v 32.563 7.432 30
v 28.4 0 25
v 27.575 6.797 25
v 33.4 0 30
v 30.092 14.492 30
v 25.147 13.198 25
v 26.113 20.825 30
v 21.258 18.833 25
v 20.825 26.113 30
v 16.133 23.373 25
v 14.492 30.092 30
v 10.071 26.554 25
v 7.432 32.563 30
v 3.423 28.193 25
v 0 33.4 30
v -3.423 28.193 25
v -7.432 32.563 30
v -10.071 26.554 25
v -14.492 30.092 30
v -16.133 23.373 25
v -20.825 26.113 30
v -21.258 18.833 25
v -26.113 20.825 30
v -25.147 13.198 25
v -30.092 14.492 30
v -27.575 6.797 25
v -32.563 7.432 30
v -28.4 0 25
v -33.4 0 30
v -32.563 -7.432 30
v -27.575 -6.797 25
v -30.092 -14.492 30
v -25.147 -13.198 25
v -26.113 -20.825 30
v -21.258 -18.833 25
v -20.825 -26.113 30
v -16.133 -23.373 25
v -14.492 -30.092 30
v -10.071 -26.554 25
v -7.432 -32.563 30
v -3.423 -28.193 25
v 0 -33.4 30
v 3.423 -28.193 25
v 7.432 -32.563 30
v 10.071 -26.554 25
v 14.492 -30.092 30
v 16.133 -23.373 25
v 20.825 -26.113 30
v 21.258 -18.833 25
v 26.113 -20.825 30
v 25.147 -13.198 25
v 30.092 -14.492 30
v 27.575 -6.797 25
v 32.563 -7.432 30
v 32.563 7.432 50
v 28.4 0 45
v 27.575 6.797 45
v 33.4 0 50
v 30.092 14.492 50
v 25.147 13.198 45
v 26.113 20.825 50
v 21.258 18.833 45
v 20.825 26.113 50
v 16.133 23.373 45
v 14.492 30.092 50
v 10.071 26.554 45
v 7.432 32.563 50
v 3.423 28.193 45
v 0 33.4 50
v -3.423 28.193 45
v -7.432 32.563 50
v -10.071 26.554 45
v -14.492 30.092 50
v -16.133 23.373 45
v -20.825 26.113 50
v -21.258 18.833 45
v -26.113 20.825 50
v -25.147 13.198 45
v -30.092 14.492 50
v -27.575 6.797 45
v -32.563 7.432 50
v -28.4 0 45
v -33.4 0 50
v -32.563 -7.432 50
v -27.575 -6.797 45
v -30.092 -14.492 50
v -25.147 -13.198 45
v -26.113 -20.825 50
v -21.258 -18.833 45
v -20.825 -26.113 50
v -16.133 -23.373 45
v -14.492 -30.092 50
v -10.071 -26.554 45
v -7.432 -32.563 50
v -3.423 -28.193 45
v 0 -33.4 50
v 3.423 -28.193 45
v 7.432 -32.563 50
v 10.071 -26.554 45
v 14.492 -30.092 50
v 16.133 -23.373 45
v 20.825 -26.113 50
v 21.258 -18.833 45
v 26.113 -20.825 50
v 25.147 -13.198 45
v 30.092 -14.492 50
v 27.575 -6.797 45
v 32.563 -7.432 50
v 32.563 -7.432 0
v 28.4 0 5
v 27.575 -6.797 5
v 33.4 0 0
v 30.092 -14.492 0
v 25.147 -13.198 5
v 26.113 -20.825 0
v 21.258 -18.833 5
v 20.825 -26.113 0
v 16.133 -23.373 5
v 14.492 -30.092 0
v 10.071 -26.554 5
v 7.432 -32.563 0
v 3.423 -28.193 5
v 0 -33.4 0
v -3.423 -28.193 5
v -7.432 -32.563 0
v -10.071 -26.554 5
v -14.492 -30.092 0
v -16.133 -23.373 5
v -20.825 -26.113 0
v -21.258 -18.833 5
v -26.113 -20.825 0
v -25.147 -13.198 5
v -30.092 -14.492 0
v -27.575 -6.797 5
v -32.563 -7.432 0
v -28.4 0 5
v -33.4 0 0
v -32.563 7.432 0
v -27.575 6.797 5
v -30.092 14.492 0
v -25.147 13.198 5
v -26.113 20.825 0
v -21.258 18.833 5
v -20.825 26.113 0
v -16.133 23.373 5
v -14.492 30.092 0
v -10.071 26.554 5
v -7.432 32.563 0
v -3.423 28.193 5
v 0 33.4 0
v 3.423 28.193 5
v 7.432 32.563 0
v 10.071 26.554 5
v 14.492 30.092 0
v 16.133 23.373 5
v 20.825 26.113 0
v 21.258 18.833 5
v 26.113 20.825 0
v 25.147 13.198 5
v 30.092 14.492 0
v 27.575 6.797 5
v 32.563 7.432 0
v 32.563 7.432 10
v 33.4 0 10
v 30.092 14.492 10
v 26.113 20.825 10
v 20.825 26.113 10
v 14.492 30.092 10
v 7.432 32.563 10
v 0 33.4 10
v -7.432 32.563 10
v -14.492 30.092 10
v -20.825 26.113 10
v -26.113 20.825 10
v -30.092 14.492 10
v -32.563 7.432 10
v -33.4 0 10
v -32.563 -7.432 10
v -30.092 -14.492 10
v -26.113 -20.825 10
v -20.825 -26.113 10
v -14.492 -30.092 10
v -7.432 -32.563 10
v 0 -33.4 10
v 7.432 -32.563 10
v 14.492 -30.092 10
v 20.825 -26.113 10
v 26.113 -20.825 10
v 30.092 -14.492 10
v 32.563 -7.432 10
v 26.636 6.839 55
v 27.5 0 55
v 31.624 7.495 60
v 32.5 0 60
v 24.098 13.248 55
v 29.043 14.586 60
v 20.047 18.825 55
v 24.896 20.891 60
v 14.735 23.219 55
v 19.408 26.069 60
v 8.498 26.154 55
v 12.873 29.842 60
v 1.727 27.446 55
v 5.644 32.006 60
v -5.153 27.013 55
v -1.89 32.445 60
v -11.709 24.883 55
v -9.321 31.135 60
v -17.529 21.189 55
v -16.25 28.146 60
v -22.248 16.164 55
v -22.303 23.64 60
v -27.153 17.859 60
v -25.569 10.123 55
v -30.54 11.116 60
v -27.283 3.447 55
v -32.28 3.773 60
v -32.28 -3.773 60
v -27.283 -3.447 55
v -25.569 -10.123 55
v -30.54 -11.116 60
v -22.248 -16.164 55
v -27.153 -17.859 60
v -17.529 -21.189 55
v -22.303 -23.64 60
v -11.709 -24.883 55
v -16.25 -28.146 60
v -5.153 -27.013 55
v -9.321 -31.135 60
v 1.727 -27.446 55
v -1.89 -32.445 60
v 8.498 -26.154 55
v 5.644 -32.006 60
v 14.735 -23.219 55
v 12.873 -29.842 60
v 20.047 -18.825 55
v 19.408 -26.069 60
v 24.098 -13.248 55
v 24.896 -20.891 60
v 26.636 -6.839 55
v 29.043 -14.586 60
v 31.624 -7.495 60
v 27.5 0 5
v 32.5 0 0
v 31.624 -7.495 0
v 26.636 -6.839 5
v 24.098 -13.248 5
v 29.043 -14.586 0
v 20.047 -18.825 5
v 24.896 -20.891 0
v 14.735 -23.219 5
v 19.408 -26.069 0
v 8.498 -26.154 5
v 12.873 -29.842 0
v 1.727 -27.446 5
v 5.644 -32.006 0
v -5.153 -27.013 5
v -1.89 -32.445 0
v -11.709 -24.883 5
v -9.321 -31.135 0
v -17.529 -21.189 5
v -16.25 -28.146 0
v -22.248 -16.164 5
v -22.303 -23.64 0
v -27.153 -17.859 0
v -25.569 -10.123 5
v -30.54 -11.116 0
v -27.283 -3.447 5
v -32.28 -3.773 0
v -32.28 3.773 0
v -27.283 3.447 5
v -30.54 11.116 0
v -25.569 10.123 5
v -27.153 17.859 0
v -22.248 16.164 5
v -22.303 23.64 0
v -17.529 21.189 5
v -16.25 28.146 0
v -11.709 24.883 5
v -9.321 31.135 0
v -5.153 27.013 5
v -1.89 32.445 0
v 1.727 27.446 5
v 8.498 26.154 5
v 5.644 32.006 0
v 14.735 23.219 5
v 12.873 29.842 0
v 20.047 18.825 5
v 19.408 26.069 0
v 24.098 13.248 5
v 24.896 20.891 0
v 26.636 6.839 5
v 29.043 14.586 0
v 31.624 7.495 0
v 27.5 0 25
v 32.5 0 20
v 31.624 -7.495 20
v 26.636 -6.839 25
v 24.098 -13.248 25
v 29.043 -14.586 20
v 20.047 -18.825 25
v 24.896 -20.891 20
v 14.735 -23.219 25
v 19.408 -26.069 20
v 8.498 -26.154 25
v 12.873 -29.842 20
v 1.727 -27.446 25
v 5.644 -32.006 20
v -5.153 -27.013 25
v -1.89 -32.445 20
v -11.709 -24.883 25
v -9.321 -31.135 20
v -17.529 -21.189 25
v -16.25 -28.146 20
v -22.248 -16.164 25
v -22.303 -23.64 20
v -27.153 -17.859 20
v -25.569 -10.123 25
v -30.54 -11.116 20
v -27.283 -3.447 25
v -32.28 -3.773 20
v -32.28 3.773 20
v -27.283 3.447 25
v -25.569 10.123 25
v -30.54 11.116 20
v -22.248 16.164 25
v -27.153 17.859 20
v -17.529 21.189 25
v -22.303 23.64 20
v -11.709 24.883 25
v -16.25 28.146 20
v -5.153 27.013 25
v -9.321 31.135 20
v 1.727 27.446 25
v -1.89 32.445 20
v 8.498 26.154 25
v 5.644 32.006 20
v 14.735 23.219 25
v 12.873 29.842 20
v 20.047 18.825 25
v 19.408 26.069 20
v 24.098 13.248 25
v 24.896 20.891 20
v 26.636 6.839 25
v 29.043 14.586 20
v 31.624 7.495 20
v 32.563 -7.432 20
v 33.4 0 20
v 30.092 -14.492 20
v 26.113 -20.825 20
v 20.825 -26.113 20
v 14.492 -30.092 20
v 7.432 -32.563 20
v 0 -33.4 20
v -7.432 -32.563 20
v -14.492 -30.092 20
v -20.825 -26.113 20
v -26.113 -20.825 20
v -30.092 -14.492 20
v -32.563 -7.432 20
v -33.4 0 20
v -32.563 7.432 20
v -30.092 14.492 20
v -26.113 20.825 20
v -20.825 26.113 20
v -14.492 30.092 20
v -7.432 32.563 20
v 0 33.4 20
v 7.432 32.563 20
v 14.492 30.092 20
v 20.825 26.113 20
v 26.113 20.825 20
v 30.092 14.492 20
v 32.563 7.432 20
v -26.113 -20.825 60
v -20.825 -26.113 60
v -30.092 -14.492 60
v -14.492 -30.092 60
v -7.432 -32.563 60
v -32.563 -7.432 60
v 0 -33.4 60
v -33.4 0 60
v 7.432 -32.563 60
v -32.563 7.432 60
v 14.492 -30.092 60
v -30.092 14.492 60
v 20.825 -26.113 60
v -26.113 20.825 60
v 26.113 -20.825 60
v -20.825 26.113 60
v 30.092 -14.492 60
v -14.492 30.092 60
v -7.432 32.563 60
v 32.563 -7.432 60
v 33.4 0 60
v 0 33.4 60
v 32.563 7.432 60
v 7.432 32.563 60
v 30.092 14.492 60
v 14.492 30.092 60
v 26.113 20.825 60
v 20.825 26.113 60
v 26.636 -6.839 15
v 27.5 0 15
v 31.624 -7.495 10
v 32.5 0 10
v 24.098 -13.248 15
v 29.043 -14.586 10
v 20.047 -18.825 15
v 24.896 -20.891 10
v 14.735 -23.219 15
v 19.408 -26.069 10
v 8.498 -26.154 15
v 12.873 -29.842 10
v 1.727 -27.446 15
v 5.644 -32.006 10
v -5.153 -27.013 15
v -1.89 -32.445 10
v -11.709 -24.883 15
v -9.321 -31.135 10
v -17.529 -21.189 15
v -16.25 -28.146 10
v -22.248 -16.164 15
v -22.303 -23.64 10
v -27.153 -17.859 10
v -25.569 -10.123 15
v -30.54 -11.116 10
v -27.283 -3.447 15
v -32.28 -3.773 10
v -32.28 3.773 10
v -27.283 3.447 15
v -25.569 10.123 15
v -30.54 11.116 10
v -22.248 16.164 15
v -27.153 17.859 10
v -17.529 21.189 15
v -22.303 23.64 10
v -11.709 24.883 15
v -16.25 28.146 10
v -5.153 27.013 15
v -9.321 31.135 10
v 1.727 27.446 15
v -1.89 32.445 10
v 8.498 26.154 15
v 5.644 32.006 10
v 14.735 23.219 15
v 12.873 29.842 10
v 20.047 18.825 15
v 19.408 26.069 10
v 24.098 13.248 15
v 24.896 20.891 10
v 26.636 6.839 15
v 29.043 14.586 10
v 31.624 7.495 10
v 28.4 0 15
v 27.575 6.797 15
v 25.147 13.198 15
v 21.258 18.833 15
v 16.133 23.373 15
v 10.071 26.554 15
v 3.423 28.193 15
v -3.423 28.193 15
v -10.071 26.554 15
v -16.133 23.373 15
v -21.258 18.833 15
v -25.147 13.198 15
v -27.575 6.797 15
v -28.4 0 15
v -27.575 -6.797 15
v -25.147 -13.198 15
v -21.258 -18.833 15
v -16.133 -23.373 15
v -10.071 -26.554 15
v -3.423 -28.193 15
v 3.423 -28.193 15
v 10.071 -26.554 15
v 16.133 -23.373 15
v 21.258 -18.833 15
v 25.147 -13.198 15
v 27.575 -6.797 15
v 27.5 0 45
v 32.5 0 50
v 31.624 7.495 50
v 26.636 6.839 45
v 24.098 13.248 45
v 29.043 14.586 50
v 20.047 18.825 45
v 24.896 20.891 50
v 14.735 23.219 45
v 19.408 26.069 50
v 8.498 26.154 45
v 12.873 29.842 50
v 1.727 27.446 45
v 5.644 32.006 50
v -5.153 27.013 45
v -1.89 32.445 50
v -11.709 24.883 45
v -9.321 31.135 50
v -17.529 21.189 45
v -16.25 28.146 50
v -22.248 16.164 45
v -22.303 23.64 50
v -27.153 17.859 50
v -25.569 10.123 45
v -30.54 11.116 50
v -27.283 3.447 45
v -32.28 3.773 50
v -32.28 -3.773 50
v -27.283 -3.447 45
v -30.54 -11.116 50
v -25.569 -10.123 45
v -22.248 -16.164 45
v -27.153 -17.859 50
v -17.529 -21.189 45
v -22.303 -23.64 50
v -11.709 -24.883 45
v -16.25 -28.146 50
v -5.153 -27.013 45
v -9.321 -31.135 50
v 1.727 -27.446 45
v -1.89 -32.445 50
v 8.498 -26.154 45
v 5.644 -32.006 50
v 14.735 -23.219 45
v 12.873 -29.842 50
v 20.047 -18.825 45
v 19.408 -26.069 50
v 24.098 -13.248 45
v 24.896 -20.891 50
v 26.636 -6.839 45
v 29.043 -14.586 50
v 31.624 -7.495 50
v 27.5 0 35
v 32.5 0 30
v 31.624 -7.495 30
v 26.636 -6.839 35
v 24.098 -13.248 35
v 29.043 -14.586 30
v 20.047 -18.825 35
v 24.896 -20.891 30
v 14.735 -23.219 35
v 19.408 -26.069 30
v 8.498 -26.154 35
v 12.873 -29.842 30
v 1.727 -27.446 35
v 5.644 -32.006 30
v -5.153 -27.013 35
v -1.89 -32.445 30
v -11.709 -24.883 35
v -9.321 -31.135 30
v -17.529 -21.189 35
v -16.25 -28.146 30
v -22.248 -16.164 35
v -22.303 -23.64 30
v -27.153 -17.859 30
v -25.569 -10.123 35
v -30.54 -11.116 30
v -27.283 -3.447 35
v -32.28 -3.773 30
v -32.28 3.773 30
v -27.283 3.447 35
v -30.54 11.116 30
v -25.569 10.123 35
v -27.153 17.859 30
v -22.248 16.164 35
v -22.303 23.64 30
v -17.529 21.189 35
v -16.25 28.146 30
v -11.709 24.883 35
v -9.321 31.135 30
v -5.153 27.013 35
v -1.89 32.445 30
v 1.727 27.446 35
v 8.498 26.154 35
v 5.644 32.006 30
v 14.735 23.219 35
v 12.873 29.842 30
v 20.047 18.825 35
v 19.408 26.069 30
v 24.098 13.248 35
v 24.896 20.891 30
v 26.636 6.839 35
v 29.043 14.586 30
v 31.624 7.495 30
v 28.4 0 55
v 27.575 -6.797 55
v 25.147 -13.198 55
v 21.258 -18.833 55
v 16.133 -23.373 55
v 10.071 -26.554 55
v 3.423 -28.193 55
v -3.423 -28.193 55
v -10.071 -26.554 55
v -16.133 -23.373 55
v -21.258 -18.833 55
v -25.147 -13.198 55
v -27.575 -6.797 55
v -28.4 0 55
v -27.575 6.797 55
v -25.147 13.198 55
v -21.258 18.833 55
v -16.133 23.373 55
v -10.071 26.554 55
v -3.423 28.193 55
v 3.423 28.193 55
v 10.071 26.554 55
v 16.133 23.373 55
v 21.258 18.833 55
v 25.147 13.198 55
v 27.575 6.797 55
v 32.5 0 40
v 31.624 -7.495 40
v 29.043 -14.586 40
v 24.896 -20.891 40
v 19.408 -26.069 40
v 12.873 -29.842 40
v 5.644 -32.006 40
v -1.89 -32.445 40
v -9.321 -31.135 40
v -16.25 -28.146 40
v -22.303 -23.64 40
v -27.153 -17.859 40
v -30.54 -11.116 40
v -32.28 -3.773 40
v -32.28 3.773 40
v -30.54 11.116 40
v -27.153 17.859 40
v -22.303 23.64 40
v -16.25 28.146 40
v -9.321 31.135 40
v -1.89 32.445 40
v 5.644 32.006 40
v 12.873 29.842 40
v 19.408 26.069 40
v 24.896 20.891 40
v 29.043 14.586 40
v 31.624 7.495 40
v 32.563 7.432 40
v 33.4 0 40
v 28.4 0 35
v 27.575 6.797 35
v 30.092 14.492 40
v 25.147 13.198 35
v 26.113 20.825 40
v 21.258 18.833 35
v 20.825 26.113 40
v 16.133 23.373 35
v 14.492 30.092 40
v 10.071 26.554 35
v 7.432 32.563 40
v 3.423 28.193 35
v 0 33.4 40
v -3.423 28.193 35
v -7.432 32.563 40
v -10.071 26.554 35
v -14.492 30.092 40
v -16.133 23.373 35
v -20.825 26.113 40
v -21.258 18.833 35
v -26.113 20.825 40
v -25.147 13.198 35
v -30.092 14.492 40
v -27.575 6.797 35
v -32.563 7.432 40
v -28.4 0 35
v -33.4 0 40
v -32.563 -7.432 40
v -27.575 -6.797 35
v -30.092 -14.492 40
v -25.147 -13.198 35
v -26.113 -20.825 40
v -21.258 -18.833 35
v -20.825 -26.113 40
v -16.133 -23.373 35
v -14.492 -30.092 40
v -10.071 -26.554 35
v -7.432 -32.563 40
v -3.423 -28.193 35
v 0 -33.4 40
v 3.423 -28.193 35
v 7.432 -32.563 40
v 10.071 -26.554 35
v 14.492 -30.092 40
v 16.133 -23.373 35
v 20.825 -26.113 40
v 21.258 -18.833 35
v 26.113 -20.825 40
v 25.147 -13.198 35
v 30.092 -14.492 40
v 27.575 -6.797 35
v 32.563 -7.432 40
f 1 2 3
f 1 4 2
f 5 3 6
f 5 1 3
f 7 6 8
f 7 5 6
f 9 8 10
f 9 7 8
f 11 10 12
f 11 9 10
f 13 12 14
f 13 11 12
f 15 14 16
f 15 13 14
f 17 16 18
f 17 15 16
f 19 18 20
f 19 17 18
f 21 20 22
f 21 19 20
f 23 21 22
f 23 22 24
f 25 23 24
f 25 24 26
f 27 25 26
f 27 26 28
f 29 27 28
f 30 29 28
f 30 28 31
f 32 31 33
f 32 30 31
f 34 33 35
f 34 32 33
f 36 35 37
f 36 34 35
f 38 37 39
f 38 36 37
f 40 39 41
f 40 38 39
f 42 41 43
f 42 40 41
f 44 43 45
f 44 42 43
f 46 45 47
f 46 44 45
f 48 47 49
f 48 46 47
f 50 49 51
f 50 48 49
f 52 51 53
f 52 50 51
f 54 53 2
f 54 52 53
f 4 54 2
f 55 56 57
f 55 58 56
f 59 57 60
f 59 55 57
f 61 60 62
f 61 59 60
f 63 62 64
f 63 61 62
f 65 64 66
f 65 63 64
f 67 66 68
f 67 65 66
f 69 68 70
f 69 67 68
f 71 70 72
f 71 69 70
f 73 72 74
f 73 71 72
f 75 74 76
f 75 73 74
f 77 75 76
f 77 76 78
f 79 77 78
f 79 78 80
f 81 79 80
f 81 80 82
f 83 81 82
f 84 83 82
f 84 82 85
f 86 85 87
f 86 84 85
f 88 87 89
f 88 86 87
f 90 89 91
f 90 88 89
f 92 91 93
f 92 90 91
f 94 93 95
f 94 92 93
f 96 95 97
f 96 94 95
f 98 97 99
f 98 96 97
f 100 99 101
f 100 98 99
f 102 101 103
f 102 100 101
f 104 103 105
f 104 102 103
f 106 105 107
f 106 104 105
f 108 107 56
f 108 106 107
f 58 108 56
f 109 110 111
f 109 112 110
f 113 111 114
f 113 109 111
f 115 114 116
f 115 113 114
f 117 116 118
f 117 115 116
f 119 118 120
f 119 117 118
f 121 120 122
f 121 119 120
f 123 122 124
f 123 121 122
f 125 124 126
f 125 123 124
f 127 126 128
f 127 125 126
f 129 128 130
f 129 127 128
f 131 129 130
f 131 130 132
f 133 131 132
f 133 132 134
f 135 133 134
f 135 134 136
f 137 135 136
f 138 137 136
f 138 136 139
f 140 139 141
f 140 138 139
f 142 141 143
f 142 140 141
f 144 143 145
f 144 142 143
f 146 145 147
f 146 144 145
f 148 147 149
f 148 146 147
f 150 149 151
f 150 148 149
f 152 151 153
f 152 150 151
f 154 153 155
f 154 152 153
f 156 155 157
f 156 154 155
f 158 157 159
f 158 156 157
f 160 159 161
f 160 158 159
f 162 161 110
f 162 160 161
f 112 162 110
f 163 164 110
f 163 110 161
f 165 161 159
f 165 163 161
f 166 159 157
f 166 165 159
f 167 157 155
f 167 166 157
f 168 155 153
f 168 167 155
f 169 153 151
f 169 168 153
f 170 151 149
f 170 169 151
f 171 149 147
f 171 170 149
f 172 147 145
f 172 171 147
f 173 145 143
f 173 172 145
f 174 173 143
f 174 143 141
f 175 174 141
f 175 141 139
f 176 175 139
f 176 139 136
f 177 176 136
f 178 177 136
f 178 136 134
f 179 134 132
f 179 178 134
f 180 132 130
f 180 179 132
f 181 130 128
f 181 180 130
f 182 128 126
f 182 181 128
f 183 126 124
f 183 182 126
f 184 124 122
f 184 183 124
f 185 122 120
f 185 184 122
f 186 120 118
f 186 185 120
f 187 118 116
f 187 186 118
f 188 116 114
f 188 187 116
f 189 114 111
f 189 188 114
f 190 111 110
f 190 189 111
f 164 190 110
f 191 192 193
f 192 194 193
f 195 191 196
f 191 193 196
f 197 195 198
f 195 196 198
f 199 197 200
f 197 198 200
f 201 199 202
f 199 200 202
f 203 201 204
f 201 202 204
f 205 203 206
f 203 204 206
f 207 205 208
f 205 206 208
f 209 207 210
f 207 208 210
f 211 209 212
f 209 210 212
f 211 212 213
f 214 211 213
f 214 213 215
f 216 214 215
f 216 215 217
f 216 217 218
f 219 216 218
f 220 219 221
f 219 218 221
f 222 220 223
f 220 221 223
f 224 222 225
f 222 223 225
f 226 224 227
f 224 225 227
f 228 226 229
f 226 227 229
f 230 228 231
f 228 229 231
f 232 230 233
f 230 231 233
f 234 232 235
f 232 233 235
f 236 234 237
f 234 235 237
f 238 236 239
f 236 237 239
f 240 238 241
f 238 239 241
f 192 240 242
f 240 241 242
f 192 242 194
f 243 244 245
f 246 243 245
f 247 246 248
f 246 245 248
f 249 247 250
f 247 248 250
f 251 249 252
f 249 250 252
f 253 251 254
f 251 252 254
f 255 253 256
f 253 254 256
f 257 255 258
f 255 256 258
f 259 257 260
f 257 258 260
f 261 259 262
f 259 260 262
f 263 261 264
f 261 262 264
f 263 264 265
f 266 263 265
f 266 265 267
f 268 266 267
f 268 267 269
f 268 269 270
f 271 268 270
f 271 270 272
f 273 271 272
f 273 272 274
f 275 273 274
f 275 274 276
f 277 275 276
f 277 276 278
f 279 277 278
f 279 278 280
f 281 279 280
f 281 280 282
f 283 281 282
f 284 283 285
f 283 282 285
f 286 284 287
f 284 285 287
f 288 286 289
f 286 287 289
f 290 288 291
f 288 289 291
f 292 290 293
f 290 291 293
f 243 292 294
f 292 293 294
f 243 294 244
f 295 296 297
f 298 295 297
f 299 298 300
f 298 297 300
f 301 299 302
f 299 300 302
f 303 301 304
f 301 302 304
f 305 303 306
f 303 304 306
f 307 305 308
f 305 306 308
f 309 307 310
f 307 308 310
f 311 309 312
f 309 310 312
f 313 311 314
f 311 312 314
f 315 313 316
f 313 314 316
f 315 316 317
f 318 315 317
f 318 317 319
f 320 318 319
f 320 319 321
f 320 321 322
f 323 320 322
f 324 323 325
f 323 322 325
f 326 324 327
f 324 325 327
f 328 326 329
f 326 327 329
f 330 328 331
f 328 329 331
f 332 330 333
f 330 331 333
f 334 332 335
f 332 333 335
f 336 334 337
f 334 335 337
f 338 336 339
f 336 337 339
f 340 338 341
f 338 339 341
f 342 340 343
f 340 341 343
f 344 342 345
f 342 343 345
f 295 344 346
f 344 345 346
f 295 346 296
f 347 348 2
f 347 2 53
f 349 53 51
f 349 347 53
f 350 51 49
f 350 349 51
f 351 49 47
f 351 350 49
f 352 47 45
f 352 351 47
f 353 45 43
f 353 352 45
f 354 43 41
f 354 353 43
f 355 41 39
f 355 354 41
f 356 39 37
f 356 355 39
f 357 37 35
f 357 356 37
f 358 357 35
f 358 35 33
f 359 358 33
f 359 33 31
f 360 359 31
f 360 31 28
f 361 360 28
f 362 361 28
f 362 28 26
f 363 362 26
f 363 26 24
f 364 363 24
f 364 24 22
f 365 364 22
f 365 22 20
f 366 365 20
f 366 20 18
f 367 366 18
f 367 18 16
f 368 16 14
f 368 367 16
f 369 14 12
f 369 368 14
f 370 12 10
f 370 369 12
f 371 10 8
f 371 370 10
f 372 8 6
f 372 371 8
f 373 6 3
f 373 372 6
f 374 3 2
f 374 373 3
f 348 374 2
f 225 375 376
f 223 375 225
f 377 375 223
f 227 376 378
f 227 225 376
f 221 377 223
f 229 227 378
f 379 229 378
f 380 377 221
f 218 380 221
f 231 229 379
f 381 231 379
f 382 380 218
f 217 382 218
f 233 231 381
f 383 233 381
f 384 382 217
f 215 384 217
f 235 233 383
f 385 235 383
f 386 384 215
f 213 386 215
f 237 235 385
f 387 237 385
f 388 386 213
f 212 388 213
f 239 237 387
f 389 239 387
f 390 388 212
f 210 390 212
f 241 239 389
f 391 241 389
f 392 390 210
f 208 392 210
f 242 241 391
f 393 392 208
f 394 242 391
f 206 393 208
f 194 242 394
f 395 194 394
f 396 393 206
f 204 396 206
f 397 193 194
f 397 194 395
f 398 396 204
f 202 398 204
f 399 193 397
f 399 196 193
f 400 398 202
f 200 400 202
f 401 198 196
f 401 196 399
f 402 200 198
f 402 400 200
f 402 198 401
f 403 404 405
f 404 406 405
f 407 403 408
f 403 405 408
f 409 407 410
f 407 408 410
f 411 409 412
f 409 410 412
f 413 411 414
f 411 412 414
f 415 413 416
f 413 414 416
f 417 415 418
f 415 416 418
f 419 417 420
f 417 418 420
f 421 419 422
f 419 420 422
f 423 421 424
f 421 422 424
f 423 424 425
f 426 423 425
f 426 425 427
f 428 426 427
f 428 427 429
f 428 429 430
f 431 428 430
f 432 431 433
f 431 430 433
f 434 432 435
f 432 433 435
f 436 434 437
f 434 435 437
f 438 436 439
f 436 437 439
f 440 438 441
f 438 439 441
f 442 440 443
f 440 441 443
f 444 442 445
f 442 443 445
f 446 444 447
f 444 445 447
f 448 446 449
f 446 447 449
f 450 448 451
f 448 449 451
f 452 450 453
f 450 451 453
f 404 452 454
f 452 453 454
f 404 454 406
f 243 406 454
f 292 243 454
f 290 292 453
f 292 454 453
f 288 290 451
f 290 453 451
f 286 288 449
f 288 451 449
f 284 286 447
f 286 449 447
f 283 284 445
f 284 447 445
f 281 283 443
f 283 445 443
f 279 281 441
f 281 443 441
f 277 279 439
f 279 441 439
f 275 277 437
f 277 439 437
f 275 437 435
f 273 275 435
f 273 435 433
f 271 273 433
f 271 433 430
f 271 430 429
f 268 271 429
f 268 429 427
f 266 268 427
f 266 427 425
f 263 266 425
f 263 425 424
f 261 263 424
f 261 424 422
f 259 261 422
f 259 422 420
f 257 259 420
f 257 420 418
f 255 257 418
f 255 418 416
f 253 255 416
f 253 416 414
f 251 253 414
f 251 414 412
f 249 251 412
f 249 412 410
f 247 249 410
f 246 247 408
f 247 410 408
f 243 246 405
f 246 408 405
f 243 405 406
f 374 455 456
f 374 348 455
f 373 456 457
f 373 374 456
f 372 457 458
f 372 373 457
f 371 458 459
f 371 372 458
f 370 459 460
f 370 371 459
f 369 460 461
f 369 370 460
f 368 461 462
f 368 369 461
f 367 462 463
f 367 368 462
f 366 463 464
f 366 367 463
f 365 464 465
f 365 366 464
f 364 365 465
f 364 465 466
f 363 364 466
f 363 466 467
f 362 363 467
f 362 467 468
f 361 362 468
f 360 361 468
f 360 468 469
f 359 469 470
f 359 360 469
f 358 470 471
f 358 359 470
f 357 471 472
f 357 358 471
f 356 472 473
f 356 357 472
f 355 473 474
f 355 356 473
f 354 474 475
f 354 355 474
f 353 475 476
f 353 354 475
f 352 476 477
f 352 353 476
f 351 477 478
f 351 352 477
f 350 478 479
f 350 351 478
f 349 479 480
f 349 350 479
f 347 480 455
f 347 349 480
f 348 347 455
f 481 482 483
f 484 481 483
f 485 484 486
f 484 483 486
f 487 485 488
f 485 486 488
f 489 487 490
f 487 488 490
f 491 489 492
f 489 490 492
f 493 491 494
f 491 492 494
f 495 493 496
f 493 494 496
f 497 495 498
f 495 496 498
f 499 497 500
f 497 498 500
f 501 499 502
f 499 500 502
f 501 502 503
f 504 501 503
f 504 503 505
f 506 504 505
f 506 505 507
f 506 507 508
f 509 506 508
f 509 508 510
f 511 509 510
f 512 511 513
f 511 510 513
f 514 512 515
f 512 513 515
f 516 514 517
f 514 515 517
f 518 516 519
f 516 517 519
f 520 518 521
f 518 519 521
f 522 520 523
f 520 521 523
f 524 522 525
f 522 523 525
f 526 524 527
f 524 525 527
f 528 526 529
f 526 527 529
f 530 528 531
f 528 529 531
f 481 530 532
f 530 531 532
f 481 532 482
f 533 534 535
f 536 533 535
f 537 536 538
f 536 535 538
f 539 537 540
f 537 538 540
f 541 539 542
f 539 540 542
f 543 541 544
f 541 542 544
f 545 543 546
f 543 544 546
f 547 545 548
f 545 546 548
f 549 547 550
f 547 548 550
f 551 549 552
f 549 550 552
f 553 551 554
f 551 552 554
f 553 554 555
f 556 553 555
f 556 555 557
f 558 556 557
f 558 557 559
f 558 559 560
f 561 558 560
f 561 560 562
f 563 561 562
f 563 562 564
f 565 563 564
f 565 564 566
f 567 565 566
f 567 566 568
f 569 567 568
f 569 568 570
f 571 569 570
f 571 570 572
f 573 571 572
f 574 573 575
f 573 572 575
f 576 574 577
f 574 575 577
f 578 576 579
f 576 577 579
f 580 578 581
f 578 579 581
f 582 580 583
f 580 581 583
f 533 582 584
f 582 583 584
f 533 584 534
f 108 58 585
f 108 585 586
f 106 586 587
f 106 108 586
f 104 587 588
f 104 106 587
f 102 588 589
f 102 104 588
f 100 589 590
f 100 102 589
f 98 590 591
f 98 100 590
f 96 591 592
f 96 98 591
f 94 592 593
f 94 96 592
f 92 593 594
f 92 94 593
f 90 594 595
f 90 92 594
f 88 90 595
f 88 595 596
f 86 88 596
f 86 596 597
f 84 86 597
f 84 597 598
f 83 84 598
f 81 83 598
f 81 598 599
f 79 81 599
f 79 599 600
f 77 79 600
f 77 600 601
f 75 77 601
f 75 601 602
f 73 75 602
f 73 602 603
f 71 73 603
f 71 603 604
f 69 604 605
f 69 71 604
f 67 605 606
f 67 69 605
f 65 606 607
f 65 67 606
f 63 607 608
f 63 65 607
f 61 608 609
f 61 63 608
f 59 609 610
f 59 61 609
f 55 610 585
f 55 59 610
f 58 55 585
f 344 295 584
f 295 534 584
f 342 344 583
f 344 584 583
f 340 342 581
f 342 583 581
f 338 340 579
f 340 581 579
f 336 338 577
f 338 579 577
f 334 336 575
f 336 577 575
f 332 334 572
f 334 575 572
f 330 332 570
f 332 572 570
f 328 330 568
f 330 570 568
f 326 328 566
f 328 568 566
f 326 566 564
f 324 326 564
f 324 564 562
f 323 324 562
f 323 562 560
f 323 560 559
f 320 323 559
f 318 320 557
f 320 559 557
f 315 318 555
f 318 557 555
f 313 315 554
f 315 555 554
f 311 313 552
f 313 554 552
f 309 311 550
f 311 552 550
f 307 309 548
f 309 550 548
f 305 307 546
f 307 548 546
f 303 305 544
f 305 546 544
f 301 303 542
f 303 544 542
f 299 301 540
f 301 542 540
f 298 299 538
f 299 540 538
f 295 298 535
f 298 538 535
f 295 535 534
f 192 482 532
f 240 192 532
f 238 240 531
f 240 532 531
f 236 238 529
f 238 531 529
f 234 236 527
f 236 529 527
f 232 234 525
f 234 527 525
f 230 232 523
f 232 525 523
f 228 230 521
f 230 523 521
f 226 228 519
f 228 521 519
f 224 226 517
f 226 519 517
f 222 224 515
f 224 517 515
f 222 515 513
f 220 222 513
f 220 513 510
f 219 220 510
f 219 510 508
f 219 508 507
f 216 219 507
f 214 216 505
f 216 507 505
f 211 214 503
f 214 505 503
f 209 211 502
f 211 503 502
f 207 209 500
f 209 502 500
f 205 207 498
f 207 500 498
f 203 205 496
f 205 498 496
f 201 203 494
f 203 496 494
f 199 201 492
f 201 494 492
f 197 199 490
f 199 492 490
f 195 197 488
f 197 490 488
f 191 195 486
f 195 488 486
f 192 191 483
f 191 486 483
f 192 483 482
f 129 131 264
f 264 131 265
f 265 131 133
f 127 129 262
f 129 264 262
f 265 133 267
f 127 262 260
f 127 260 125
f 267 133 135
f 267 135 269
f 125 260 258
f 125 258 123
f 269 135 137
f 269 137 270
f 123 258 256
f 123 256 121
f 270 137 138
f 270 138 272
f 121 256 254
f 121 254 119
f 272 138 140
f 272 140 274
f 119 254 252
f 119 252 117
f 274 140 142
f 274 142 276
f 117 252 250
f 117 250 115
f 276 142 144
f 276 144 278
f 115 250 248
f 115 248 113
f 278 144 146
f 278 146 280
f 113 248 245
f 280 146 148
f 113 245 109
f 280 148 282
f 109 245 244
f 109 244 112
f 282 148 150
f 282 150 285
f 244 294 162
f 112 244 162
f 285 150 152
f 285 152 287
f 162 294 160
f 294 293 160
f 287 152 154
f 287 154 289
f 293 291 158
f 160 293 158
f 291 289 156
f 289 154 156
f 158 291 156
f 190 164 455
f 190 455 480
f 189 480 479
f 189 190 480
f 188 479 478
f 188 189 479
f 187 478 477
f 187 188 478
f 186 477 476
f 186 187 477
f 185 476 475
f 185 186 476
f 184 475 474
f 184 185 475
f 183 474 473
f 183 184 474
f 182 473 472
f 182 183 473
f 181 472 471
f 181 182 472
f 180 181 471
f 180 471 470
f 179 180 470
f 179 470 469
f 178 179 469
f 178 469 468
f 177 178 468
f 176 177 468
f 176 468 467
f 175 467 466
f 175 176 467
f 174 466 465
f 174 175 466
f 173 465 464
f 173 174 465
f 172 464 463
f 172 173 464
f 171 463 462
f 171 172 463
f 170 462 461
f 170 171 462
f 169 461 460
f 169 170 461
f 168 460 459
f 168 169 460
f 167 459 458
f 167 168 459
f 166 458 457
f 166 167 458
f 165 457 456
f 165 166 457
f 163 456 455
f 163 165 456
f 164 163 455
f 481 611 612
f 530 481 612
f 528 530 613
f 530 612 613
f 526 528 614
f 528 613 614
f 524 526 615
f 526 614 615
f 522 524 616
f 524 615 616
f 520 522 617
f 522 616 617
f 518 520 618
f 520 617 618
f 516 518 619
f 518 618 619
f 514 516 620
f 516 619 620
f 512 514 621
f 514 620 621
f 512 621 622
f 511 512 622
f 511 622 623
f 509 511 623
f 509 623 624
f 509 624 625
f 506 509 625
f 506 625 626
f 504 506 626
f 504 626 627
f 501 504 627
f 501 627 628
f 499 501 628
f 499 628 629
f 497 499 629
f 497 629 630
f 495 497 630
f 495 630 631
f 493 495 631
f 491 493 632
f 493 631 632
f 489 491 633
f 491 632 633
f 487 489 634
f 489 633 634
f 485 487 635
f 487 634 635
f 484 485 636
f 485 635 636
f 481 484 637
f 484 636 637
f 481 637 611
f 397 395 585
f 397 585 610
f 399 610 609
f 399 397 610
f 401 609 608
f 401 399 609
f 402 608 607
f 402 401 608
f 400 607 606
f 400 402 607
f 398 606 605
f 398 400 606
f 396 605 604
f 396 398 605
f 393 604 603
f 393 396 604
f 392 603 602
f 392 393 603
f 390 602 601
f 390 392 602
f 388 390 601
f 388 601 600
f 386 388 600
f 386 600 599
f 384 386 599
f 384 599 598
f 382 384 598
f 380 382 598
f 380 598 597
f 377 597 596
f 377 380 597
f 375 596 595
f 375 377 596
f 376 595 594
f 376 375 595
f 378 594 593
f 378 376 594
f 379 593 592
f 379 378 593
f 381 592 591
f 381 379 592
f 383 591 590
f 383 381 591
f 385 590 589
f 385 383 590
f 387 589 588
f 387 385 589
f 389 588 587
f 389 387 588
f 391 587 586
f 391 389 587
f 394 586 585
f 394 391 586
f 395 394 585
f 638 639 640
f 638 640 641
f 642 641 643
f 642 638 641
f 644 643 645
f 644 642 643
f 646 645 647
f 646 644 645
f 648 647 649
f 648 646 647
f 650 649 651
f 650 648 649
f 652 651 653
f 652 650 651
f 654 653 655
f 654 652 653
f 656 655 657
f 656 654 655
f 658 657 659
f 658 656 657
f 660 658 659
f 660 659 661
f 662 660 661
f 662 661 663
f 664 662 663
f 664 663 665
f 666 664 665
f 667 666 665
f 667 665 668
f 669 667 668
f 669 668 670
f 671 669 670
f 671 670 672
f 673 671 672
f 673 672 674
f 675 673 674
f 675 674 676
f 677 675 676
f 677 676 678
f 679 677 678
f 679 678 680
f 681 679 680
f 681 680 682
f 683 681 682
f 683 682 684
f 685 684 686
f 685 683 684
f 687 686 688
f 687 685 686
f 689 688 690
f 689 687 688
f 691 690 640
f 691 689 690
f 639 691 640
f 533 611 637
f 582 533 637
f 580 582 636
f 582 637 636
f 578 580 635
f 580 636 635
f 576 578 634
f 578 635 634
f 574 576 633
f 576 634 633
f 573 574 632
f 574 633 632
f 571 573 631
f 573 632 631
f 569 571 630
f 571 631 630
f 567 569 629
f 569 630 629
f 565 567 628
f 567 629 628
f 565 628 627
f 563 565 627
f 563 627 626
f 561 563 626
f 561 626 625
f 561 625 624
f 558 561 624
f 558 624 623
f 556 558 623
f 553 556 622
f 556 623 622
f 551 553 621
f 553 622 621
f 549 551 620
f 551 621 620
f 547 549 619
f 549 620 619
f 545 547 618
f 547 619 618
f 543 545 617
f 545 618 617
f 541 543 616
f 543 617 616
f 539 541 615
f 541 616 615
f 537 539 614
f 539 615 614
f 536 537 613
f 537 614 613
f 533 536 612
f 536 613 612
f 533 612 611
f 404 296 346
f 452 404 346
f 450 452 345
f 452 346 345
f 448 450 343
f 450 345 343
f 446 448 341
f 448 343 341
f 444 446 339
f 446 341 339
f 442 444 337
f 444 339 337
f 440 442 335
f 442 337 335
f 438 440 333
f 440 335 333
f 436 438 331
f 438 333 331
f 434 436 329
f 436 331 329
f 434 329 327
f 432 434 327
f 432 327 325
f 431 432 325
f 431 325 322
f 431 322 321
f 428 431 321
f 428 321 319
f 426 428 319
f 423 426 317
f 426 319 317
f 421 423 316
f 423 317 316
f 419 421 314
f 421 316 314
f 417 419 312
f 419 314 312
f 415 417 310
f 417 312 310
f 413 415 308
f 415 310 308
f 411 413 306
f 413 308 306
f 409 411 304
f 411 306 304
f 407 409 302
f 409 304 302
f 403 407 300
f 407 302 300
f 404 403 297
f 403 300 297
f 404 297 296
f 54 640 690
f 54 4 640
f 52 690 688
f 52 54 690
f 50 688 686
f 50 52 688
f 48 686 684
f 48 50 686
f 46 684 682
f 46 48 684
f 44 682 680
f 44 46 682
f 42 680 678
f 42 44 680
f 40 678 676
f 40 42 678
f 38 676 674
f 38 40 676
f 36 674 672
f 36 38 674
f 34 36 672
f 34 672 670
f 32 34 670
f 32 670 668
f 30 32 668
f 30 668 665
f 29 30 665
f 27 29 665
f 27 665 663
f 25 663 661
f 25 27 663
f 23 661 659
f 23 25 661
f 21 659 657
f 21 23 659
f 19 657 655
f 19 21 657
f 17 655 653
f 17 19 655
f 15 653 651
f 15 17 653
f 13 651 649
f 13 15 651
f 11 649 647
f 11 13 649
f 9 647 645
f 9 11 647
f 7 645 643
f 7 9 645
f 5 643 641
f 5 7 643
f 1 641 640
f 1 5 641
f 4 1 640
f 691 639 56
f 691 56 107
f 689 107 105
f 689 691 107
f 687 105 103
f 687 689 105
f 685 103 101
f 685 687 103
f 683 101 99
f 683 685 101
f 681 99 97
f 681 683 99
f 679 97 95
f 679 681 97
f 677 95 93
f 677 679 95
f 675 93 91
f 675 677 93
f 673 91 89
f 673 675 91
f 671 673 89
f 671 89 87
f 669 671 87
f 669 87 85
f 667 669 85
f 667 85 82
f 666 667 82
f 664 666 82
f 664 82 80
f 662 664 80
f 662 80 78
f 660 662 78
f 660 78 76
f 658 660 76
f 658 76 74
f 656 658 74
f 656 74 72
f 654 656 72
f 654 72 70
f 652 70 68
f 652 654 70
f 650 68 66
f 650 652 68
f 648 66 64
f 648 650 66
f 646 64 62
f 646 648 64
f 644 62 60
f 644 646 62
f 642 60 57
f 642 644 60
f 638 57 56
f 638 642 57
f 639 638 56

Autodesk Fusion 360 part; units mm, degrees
sketch "Sketch1" plane through (0, 0, 0) normal (0, 1, 0) x (1, 0, 0)
  line L0 (32.5, 0) -> (27.5, -5)
  line L1 (27.5, -5) -> (32.5, -10)
  line L2 (33.4, 0) -> (28.4, -5)
  line L3 (28.4, -5) -> (33.4, -10)
  line L4 (32.5, 0) -> (33.4, 0)
  line L5 (33.4, -10) -> (32.5, -10)
  line L6 (32.5, 0) -> (0, 0) construction
  point P0 (30, -2.5)
  dimension "d1" = 0.9
  dimension "d2" = 10
  dimension "d11" = 30
  dimension "d12" = 32.5
revolve "Revolve1" add sketch "Sketch1" angle 360 about axis through (0, 0, 1.75) along (0, 0, 1) makes body 1
pattern_linear "R-Pattern1" count 6 spacing 10 along (0, 0, 1) of bodies 1 makes body 2 at (31.5756, -3.1596, 18.3333) makes body 3 at (31.5756, -3.1596, 28.3333) makes body 4 at (31.5756, -3.1596, 38.3333) makes body 5 at (31.5756, -3.1596, 48.3333) makes body 6 at (31.5756, -3.1596, 58.3333)
combine "Combine1" operation add target body 1 tool bodies 2 4 5 6 3
